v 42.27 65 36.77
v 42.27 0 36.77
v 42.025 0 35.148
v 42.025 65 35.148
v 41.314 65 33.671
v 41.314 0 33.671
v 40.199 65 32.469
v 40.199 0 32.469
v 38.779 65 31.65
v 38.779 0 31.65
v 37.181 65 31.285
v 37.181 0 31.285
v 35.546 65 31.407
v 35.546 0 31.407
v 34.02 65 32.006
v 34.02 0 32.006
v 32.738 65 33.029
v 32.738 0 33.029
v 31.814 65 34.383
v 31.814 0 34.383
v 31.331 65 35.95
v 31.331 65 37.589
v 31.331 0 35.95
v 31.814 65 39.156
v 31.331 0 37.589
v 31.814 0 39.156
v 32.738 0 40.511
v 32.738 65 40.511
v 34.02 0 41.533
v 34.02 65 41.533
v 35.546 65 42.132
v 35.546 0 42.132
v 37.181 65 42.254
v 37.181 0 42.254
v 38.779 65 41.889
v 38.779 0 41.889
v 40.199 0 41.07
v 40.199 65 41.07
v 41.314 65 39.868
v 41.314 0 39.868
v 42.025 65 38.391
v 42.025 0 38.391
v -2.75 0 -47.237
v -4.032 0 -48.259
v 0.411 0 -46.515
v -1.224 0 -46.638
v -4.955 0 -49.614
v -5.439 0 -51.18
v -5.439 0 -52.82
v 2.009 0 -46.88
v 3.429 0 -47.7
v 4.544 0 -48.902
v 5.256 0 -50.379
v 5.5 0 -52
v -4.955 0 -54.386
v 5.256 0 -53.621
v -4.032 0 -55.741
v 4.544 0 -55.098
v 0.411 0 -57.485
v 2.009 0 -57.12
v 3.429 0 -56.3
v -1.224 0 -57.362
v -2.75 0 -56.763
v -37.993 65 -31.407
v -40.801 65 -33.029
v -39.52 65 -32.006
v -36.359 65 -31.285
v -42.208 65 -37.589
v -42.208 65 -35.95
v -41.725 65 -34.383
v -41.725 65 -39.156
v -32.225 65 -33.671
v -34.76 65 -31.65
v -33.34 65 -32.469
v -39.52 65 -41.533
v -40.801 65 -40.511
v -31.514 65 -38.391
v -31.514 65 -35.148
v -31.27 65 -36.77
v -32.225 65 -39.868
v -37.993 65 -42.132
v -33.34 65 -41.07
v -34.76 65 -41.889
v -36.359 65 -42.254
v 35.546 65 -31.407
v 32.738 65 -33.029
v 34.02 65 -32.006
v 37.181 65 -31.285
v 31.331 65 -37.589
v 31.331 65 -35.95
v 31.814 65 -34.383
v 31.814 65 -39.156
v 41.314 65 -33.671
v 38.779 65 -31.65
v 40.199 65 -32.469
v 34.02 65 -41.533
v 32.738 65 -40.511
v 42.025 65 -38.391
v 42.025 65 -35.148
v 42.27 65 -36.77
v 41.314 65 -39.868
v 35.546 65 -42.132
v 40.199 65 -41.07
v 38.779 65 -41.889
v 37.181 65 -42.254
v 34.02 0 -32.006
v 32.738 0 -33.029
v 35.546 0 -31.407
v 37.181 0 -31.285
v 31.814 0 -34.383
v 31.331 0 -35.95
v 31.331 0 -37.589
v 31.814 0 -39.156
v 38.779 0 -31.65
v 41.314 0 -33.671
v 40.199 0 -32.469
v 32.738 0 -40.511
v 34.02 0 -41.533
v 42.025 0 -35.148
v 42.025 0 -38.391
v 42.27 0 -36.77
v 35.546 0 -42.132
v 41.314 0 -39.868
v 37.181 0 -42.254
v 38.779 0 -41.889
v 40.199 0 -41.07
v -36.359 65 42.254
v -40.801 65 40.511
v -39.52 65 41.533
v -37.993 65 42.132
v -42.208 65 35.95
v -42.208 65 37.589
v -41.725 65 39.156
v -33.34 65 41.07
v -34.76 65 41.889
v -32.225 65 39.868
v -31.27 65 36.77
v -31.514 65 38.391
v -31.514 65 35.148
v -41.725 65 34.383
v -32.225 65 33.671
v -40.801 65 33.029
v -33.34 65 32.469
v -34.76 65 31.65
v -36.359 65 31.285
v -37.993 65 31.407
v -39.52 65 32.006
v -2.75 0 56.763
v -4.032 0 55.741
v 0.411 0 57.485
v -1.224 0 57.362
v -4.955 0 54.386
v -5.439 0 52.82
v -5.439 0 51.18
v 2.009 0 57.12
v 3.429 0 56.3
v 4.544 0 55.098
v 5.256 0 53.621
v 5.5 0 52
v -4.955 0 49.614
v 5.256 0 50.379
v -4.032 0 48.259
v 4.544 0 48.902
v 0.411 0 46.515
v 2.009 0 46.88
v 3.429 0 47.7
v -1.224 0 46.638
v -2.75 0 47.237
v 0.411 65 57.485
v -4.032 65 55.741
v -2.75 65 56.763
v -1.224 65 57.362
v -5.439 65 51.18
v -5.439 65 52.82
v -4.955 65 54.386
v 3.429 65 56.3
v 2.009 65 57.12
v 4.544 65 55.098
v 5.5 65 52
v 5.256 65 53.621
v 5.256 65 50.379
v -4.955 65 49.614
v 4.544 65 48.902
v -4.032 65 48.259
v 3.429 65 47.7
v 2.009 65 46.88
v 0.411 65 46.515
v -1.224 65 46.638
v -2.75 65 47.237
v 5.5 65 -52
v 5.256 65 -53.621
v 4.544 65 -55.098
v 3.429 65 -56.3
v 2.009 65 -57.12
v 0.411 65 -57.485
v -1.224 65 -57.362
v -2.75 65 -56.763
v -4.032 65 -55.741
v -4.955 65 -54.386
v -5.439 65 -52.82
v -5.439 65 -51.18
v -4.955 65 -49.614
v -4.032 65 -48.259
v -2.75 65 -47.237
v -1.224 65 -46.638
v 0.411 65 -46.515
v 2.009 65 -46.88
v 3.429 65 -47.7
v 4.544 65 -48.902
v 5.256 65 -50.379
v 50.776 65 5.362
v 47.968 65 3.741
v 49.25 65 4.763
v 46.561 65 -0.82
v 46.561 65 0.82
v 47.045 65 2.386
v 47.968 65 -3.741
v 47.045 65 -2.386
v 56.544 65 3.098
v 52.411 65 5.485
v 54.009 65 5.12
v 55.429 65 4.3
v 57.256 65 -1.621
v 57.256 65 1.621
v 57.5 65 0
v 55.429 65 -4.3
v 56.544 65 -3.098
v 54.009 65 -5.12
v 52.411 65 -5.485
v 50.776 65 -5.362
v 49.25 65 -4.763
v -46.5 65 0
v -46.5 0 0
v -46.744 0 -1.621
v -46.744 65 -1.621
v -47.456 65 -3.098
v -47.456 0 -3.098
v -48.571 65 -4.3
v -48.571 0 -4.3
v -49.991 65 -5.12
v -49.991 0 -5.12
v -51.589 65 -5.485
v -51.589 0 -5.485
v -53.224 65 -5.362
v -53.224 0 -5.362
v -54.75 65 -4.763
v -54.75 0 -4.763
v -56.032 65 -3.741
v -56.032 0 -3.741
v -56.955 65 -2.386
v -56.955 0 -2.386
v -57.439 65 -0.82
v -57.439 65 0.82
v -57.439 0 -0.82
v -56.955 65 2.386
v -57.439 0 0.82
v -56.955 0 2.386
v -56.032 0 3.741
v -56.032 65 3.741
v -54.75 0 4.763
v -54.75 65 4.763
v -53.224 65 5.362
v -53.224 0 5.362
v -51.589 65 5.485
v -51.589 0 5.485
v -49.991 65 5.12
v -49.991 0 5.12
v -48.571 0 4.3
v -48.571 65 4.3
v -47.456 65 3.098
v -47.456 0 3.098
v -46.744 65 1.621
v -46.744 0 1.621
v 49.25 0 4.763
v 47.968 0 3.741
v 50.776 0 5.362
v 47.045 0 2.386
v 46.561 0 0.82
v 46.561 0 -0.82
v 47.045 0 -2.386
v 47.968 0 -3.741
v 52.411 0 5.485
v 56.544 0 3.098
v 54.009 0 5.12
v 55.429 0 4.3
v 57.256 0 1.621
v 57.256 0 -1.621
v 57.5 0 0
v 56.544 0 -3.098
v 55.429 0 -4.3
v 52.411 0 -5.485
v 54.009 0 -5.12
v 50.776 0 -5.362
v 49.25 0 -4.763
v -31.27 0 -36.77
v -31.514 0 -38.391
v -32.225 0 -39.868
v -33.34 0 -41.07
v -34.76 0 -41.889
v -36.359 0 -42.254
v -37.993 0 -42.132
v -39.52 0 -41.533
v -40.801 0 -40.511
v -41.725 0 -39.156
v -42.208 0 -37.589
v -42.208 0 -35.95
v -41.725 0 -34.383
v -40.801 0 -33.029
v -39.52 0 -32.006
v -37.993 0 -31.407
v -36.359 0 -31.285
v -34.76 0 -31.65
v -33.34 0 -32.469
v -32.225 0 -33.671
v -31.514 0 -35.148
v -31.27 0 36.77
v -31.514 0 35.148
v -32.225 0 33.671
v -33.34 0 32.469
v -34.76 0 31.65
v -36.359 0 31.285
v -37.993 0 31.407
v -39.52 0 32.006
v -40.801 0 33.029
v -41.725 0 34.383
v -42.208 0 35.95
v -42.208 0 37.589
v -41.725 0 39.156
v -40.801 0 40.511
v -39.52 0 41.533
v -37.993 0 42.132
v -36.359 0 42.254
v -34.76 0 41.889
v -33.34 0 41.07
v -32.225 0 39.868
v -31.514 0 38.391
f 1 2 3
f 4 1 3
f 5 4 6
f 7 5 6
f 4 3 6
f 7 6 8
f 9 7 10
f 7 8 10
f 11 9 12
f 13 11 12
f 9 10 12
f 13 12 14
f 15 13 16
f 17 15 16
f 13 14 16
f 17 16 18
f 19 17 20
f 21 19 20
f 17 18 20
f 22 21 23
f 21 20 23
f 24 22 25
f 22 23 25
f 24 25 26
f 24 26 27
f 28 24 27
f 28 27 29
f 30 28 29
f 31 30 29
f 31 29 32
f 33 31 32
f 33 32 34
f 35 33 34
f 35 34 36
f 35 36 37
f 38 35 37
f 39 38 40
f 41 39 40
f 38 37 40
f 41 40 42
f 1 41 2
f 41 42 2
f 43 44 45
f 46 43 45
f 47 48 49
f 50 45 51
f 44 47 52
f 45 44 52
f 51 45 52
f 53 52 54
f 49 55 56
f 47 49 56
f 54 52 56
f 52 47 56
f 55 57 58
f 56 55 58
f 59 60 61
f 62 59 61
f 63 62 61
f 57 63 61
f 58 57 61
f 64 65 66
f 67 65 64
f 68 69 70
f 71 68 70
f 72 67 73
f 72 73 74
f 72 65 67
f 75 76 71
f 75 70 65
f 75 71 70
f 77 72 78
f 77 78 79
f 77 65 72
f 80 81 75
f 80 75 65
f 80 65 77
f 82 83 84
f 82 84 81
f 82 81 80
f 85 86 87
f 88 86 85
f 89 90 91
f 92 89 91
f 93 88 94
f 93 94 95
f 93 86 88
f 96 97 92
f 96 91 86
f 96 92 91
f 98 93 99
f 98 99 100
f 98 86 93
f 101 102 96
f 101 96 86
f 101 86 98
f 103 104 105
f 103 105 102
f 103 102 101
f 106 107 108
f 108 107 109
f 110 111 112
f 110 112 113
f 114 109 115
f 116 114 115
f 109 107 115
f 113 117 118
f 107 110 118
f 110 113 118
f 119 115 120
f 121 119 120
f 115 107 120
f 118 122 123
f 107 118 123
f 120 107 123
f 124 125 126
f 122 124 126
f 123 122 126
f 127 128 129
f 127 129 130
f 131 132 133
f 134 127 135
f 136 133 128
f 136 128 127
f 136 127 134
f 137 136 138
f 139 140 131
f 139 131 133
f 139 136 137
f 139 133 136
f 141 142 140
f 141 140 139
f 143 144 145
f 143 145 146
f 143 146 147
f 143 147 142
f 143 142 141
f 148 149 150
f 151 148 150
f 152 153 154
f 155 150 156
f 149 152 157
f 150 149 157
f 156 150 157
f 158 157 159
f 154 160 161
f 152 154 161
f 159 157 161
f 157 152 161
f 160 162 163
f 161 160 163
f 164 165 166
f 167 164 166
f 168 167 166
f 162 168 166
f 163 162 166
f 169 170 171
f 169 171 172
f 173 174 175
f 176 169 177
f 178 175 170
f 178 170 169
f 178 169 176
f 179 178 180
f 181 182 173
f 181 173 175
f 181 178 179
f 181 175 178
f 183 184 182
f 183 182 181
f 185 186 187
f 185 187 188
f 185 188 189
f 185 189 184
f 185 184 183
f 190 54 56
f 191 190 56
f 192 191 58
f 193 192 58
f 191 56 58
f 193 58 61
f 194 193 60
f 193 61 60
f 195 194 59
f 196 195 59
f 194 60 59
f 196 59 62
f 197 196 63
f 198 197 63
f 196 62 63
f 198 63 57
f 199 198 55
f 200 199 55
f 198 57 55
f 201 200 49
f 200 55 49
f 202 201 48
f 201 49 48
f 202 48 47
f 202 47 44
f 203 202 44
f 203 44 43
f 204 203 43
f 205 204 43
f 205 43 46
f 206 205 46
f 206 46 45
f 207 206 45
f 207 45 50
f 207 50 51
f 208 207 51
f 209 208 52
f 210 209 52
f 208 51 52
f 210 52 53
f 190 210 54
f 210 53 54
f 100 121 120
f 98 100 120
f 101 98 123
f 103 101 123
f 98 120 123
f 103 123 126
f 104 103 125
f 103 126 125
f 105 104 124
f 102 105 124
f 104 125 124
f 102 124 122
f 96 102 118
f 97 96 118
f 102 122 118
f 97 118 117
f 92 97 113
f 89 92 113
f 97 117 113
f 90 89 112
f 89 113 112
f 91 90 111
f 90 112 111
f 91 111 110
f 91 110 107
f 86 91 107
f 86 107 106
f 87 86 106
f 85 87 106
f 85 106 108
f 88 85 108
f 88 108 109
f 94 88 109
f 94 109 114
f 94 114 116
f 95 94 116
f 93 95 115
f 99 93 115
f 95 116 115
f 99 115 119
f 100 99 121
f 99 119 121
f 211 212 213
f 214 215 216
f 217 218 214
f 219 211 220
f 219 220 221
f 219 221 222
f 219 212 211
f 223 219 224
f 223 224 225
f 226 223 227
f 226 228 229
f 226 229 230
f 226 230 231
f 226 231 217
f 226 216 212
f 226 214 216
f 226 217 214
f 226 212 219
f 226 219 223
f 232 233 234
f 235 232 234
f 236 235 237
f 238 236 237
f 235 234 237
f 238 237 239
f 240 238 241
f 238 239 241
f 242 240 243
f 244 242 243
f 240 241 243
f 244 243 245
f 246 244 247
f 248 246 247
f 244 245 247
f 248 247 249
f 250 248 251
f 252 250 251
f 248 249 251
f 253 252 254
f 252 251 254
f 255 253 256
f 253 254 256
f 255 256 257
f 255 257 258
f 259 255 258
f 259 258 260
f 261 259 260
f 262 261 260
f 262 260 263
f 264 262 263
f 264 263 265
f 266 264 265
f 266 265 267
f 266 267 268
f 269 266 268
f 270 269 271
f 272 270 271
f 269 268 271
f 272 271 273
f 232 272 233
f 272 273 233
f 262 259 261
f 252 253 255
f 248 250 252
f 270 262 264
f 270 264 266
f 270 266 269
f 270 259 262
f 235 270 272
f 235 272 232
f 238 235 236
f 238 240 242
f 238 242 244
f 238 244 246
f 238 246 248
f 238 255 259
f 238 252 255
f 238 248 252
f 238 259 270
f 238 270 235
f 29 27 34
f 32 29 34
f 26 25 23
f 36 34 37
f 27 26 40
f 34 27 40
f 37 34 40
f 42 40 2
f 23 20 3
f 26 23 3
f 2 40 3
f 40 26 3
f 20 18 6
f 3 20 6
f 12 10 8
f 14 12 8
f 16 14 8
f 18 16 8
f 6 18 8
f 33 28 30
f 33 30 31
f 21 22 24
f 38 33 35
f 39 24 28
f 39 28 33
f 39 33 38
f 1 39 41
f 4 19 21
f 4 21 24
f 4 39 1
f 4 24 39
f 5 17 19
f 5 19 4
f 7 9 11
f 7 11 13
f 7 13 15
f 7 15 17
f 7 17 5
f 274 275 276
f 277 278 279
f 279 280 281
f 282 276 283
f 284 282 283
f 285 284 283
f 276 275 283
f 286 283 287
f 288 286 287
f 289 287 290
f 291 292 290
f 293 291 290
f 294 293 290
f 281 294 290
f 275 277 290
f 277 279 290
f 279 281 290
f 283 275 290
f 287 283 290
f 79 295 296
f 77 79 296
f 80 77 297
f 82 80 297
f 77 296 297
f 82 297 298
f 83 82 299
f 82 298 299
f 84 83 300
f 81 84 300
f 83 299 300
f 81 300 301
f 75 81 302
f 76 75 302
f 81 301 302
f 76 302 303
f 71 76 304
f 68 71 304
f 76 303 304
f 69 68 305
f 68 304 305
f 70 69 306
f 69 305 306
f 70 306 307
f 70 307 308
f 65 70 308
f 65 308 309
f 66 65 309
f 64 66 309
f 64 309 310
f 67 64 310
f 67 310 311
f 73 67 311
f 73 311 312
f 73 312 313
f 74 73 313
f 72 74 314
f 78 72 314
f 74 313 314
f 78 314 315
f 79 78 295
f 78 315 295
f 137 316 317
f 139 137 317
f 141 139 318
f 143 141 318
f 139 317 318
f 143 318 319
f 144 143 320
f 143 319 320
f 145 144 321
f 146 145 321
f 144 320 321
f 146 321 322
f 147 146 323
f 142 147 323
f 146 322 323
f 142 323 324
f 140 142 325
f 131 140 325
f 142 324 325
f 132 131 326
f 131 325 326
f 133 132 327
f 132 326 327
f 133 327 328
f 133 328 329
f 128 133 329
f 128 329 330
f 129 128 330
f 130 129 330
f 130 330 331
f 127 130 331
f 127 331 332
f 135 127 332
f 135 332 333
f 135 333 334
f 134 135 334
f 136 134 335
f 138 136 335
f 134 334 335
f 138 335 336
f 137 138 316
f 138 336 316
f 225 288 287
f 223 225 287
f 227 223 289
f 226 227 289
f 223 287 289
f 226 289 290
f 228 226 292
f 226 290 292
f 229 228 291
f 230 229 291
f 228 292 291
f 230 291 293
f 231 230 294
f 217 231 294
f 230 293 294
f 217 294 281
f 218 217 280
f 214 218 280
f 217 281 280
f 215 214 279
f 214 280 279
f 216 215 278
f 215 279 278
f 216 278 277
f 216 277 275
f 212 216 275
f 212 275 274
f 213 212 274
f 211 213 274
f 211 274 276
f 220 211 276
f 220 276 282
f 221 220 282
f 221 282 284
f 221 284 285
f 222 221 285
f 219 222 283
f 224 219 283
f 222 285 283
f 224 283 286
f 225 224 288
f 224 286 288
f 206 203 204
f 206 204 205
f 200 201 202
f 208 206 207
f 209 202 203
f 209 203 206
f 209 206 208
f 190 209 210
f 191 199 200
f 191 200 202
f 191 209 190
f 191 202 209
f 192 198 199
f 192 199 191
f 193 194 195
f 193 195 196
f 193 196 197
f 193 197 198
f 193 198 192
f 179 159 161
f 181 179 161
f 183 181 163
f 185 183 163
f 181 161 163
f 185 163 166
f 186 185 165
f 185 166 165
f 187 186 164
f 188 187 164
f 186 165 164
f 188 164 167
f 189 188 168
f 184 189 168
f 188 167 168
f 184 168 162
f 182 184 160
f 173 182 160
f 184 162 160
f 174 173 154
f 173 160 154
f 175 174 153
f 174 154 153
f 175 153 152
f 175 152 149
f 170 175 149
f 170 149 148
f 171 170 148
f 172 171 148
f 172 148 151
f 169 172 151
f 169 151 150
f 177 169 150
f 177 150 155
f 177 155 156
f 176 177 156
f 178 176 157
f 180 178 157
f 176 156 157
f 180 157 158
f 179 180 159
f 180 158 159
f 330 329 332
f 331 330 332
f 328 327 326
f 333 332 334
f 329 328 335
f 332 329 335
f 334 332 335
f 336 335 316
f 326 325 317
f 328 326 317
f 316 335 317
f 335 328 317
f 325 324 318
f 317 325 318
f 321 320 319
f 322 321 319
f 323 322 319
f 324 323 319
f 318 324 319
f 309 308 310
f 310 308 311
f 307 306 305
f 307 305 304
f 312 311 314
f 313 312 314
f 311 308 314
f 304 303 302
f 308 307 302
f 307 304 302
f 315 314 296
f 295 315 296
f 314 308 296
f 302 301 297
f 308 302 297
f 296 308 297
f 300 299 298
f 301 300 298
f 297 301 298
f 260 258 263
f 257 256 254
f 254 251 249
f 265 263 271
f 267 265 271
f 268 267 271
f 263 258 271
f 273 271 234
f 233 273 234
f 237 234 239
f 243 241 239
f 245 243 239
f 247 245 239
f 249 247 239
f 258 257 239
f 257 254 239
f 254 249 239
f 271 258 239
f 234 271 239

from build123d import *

# Parameters (mm, degrees)
SKETCH1_R             = 5.5
BOSS_EXTRUDE1_DEPTH   = 65
BOSS_EXTRUDE1_2_DEPTH = 65
BOSS_EXTRUDE1_3_DEPTH = 65
BOSS_EXTRUDE1_4_DEPTH = 65
BOSS_EXTRUDE1_5_DEPTH = 65
BOSS_EXTRUDE1_6_DEPTH = 65
BOSS_EXTRUDE1_7_DEPTH = 65
BOSS_EXTRUDE1_8_DEPTH = 65


with BuildPart() as part:
    # Sketch1 → Boss-Extrude1 (new body)
    with BuildSketch(Plane(origin=(0, 0, 0), x_dir=(1, 0, 0), z_dir=(0, 1, 0))):
        with Locations((-52, 0)):
            Circle(SKETCH1_R)
    extrude(amount=BOSS_EXTRUDE1_DEPTH)


with BuildPart() as body_2:
    # Sketch1 → Boss-Extrude1 2 (new body)
    with BuildSketch(Plane(origin=(0, 0, 0), x_dir=(1, 0, 0), z_dir=(0, 1, 0))):
        with Locations((-36.769552622, 36.769552622)):
            Circle(SKETCH1_R)
    extrude(amount=BOSS_EXTRUDE1_2_DEPTH)


with BuildPart() as body_3:
    # Sketch1 → Boss-Extrude1 3 (new body)
    with BuildSketch(Plane(origin=(0, 0, 0), x_dir=(1, 0, 0), z_dir=(0, 1, 0))):
        with Locations((0, 52)):
            Circle(SKETCH1_R)
    extrude(amount=BOSS_EXTRUDE1_3_DEPTH)


with BuildPart() as body_4:
    # Sketch1 → Boss-Extrude1 4 (new body)
    with BuildSketch(Plane(origin=(0, 0, 0), x_dir=(1, 0, 0), z_dir=(0, 1, 0))):
        with Locations((36.769552622, 36.769552622)):
            Circle(SKETCH1_R)
    extrude(amount=BOSS_EXTRUDE1_4_DEPTH)


with BuildPart() as body_5:
    # Sketch1 → Boss-Extrude1 5 (new body)
    with BuildSketch(Plane(origin=(0, 0, 0), x_dir=(1, 0, 0), z_dir=(0, 1, 0))):
        with Locations((52, 0)):
            Circle(SKETCH1_R)
    extrude(amount=BOSS_EXTRUDE1_5_DEPTH)


with BuildPart() as body_6:
    # Sketch1 → Boss-Extrude1 6 (new body)
    with BuildSketch(Plane(origin=(0, 0, 0), x_dir=(1, 0, 0), z_dir=(0, 1, 0))):
        with Locations((36.769552622, -36.769552622)):
            Circle(SKETCH1_R)
    extrude(amount=BOSS_EXTRUDE1_6_DEPTH)


with BuildPart() as body_7:
    # Sketch1 → Boss-Extrude1 7 (new body)
    with BuildSketch(Plane(origin=(0, 0, 0), x_dir=(1, 0, 0), z_dir=(0, 1, 0))):
        with Locations((0, -52)):
            Circle(SKETCH1_R)
    extrude(amount=BOSS_EXTRUDE1_7_DEPTH)


with BuildPart() as body_8:
    # Sketch1 → Boss-Extrude1 8 (new body)
    with BuildSketch(Plane(origin=(0, 0, 0), x_dir=(1, 0, 0), z_dir=(0, 1, 0))):
        with Locations((-36.769552622, -36.769552622)):
            Circle(SKETCH1_R)
    extrude(amount=BOSS_EXTRUDE1_8_DEPTH)


solid = Compound([part.part, body_2.part, body_3.part, body_4.part, body_5.part, body_6.part, body_7.part, body_8.part])
